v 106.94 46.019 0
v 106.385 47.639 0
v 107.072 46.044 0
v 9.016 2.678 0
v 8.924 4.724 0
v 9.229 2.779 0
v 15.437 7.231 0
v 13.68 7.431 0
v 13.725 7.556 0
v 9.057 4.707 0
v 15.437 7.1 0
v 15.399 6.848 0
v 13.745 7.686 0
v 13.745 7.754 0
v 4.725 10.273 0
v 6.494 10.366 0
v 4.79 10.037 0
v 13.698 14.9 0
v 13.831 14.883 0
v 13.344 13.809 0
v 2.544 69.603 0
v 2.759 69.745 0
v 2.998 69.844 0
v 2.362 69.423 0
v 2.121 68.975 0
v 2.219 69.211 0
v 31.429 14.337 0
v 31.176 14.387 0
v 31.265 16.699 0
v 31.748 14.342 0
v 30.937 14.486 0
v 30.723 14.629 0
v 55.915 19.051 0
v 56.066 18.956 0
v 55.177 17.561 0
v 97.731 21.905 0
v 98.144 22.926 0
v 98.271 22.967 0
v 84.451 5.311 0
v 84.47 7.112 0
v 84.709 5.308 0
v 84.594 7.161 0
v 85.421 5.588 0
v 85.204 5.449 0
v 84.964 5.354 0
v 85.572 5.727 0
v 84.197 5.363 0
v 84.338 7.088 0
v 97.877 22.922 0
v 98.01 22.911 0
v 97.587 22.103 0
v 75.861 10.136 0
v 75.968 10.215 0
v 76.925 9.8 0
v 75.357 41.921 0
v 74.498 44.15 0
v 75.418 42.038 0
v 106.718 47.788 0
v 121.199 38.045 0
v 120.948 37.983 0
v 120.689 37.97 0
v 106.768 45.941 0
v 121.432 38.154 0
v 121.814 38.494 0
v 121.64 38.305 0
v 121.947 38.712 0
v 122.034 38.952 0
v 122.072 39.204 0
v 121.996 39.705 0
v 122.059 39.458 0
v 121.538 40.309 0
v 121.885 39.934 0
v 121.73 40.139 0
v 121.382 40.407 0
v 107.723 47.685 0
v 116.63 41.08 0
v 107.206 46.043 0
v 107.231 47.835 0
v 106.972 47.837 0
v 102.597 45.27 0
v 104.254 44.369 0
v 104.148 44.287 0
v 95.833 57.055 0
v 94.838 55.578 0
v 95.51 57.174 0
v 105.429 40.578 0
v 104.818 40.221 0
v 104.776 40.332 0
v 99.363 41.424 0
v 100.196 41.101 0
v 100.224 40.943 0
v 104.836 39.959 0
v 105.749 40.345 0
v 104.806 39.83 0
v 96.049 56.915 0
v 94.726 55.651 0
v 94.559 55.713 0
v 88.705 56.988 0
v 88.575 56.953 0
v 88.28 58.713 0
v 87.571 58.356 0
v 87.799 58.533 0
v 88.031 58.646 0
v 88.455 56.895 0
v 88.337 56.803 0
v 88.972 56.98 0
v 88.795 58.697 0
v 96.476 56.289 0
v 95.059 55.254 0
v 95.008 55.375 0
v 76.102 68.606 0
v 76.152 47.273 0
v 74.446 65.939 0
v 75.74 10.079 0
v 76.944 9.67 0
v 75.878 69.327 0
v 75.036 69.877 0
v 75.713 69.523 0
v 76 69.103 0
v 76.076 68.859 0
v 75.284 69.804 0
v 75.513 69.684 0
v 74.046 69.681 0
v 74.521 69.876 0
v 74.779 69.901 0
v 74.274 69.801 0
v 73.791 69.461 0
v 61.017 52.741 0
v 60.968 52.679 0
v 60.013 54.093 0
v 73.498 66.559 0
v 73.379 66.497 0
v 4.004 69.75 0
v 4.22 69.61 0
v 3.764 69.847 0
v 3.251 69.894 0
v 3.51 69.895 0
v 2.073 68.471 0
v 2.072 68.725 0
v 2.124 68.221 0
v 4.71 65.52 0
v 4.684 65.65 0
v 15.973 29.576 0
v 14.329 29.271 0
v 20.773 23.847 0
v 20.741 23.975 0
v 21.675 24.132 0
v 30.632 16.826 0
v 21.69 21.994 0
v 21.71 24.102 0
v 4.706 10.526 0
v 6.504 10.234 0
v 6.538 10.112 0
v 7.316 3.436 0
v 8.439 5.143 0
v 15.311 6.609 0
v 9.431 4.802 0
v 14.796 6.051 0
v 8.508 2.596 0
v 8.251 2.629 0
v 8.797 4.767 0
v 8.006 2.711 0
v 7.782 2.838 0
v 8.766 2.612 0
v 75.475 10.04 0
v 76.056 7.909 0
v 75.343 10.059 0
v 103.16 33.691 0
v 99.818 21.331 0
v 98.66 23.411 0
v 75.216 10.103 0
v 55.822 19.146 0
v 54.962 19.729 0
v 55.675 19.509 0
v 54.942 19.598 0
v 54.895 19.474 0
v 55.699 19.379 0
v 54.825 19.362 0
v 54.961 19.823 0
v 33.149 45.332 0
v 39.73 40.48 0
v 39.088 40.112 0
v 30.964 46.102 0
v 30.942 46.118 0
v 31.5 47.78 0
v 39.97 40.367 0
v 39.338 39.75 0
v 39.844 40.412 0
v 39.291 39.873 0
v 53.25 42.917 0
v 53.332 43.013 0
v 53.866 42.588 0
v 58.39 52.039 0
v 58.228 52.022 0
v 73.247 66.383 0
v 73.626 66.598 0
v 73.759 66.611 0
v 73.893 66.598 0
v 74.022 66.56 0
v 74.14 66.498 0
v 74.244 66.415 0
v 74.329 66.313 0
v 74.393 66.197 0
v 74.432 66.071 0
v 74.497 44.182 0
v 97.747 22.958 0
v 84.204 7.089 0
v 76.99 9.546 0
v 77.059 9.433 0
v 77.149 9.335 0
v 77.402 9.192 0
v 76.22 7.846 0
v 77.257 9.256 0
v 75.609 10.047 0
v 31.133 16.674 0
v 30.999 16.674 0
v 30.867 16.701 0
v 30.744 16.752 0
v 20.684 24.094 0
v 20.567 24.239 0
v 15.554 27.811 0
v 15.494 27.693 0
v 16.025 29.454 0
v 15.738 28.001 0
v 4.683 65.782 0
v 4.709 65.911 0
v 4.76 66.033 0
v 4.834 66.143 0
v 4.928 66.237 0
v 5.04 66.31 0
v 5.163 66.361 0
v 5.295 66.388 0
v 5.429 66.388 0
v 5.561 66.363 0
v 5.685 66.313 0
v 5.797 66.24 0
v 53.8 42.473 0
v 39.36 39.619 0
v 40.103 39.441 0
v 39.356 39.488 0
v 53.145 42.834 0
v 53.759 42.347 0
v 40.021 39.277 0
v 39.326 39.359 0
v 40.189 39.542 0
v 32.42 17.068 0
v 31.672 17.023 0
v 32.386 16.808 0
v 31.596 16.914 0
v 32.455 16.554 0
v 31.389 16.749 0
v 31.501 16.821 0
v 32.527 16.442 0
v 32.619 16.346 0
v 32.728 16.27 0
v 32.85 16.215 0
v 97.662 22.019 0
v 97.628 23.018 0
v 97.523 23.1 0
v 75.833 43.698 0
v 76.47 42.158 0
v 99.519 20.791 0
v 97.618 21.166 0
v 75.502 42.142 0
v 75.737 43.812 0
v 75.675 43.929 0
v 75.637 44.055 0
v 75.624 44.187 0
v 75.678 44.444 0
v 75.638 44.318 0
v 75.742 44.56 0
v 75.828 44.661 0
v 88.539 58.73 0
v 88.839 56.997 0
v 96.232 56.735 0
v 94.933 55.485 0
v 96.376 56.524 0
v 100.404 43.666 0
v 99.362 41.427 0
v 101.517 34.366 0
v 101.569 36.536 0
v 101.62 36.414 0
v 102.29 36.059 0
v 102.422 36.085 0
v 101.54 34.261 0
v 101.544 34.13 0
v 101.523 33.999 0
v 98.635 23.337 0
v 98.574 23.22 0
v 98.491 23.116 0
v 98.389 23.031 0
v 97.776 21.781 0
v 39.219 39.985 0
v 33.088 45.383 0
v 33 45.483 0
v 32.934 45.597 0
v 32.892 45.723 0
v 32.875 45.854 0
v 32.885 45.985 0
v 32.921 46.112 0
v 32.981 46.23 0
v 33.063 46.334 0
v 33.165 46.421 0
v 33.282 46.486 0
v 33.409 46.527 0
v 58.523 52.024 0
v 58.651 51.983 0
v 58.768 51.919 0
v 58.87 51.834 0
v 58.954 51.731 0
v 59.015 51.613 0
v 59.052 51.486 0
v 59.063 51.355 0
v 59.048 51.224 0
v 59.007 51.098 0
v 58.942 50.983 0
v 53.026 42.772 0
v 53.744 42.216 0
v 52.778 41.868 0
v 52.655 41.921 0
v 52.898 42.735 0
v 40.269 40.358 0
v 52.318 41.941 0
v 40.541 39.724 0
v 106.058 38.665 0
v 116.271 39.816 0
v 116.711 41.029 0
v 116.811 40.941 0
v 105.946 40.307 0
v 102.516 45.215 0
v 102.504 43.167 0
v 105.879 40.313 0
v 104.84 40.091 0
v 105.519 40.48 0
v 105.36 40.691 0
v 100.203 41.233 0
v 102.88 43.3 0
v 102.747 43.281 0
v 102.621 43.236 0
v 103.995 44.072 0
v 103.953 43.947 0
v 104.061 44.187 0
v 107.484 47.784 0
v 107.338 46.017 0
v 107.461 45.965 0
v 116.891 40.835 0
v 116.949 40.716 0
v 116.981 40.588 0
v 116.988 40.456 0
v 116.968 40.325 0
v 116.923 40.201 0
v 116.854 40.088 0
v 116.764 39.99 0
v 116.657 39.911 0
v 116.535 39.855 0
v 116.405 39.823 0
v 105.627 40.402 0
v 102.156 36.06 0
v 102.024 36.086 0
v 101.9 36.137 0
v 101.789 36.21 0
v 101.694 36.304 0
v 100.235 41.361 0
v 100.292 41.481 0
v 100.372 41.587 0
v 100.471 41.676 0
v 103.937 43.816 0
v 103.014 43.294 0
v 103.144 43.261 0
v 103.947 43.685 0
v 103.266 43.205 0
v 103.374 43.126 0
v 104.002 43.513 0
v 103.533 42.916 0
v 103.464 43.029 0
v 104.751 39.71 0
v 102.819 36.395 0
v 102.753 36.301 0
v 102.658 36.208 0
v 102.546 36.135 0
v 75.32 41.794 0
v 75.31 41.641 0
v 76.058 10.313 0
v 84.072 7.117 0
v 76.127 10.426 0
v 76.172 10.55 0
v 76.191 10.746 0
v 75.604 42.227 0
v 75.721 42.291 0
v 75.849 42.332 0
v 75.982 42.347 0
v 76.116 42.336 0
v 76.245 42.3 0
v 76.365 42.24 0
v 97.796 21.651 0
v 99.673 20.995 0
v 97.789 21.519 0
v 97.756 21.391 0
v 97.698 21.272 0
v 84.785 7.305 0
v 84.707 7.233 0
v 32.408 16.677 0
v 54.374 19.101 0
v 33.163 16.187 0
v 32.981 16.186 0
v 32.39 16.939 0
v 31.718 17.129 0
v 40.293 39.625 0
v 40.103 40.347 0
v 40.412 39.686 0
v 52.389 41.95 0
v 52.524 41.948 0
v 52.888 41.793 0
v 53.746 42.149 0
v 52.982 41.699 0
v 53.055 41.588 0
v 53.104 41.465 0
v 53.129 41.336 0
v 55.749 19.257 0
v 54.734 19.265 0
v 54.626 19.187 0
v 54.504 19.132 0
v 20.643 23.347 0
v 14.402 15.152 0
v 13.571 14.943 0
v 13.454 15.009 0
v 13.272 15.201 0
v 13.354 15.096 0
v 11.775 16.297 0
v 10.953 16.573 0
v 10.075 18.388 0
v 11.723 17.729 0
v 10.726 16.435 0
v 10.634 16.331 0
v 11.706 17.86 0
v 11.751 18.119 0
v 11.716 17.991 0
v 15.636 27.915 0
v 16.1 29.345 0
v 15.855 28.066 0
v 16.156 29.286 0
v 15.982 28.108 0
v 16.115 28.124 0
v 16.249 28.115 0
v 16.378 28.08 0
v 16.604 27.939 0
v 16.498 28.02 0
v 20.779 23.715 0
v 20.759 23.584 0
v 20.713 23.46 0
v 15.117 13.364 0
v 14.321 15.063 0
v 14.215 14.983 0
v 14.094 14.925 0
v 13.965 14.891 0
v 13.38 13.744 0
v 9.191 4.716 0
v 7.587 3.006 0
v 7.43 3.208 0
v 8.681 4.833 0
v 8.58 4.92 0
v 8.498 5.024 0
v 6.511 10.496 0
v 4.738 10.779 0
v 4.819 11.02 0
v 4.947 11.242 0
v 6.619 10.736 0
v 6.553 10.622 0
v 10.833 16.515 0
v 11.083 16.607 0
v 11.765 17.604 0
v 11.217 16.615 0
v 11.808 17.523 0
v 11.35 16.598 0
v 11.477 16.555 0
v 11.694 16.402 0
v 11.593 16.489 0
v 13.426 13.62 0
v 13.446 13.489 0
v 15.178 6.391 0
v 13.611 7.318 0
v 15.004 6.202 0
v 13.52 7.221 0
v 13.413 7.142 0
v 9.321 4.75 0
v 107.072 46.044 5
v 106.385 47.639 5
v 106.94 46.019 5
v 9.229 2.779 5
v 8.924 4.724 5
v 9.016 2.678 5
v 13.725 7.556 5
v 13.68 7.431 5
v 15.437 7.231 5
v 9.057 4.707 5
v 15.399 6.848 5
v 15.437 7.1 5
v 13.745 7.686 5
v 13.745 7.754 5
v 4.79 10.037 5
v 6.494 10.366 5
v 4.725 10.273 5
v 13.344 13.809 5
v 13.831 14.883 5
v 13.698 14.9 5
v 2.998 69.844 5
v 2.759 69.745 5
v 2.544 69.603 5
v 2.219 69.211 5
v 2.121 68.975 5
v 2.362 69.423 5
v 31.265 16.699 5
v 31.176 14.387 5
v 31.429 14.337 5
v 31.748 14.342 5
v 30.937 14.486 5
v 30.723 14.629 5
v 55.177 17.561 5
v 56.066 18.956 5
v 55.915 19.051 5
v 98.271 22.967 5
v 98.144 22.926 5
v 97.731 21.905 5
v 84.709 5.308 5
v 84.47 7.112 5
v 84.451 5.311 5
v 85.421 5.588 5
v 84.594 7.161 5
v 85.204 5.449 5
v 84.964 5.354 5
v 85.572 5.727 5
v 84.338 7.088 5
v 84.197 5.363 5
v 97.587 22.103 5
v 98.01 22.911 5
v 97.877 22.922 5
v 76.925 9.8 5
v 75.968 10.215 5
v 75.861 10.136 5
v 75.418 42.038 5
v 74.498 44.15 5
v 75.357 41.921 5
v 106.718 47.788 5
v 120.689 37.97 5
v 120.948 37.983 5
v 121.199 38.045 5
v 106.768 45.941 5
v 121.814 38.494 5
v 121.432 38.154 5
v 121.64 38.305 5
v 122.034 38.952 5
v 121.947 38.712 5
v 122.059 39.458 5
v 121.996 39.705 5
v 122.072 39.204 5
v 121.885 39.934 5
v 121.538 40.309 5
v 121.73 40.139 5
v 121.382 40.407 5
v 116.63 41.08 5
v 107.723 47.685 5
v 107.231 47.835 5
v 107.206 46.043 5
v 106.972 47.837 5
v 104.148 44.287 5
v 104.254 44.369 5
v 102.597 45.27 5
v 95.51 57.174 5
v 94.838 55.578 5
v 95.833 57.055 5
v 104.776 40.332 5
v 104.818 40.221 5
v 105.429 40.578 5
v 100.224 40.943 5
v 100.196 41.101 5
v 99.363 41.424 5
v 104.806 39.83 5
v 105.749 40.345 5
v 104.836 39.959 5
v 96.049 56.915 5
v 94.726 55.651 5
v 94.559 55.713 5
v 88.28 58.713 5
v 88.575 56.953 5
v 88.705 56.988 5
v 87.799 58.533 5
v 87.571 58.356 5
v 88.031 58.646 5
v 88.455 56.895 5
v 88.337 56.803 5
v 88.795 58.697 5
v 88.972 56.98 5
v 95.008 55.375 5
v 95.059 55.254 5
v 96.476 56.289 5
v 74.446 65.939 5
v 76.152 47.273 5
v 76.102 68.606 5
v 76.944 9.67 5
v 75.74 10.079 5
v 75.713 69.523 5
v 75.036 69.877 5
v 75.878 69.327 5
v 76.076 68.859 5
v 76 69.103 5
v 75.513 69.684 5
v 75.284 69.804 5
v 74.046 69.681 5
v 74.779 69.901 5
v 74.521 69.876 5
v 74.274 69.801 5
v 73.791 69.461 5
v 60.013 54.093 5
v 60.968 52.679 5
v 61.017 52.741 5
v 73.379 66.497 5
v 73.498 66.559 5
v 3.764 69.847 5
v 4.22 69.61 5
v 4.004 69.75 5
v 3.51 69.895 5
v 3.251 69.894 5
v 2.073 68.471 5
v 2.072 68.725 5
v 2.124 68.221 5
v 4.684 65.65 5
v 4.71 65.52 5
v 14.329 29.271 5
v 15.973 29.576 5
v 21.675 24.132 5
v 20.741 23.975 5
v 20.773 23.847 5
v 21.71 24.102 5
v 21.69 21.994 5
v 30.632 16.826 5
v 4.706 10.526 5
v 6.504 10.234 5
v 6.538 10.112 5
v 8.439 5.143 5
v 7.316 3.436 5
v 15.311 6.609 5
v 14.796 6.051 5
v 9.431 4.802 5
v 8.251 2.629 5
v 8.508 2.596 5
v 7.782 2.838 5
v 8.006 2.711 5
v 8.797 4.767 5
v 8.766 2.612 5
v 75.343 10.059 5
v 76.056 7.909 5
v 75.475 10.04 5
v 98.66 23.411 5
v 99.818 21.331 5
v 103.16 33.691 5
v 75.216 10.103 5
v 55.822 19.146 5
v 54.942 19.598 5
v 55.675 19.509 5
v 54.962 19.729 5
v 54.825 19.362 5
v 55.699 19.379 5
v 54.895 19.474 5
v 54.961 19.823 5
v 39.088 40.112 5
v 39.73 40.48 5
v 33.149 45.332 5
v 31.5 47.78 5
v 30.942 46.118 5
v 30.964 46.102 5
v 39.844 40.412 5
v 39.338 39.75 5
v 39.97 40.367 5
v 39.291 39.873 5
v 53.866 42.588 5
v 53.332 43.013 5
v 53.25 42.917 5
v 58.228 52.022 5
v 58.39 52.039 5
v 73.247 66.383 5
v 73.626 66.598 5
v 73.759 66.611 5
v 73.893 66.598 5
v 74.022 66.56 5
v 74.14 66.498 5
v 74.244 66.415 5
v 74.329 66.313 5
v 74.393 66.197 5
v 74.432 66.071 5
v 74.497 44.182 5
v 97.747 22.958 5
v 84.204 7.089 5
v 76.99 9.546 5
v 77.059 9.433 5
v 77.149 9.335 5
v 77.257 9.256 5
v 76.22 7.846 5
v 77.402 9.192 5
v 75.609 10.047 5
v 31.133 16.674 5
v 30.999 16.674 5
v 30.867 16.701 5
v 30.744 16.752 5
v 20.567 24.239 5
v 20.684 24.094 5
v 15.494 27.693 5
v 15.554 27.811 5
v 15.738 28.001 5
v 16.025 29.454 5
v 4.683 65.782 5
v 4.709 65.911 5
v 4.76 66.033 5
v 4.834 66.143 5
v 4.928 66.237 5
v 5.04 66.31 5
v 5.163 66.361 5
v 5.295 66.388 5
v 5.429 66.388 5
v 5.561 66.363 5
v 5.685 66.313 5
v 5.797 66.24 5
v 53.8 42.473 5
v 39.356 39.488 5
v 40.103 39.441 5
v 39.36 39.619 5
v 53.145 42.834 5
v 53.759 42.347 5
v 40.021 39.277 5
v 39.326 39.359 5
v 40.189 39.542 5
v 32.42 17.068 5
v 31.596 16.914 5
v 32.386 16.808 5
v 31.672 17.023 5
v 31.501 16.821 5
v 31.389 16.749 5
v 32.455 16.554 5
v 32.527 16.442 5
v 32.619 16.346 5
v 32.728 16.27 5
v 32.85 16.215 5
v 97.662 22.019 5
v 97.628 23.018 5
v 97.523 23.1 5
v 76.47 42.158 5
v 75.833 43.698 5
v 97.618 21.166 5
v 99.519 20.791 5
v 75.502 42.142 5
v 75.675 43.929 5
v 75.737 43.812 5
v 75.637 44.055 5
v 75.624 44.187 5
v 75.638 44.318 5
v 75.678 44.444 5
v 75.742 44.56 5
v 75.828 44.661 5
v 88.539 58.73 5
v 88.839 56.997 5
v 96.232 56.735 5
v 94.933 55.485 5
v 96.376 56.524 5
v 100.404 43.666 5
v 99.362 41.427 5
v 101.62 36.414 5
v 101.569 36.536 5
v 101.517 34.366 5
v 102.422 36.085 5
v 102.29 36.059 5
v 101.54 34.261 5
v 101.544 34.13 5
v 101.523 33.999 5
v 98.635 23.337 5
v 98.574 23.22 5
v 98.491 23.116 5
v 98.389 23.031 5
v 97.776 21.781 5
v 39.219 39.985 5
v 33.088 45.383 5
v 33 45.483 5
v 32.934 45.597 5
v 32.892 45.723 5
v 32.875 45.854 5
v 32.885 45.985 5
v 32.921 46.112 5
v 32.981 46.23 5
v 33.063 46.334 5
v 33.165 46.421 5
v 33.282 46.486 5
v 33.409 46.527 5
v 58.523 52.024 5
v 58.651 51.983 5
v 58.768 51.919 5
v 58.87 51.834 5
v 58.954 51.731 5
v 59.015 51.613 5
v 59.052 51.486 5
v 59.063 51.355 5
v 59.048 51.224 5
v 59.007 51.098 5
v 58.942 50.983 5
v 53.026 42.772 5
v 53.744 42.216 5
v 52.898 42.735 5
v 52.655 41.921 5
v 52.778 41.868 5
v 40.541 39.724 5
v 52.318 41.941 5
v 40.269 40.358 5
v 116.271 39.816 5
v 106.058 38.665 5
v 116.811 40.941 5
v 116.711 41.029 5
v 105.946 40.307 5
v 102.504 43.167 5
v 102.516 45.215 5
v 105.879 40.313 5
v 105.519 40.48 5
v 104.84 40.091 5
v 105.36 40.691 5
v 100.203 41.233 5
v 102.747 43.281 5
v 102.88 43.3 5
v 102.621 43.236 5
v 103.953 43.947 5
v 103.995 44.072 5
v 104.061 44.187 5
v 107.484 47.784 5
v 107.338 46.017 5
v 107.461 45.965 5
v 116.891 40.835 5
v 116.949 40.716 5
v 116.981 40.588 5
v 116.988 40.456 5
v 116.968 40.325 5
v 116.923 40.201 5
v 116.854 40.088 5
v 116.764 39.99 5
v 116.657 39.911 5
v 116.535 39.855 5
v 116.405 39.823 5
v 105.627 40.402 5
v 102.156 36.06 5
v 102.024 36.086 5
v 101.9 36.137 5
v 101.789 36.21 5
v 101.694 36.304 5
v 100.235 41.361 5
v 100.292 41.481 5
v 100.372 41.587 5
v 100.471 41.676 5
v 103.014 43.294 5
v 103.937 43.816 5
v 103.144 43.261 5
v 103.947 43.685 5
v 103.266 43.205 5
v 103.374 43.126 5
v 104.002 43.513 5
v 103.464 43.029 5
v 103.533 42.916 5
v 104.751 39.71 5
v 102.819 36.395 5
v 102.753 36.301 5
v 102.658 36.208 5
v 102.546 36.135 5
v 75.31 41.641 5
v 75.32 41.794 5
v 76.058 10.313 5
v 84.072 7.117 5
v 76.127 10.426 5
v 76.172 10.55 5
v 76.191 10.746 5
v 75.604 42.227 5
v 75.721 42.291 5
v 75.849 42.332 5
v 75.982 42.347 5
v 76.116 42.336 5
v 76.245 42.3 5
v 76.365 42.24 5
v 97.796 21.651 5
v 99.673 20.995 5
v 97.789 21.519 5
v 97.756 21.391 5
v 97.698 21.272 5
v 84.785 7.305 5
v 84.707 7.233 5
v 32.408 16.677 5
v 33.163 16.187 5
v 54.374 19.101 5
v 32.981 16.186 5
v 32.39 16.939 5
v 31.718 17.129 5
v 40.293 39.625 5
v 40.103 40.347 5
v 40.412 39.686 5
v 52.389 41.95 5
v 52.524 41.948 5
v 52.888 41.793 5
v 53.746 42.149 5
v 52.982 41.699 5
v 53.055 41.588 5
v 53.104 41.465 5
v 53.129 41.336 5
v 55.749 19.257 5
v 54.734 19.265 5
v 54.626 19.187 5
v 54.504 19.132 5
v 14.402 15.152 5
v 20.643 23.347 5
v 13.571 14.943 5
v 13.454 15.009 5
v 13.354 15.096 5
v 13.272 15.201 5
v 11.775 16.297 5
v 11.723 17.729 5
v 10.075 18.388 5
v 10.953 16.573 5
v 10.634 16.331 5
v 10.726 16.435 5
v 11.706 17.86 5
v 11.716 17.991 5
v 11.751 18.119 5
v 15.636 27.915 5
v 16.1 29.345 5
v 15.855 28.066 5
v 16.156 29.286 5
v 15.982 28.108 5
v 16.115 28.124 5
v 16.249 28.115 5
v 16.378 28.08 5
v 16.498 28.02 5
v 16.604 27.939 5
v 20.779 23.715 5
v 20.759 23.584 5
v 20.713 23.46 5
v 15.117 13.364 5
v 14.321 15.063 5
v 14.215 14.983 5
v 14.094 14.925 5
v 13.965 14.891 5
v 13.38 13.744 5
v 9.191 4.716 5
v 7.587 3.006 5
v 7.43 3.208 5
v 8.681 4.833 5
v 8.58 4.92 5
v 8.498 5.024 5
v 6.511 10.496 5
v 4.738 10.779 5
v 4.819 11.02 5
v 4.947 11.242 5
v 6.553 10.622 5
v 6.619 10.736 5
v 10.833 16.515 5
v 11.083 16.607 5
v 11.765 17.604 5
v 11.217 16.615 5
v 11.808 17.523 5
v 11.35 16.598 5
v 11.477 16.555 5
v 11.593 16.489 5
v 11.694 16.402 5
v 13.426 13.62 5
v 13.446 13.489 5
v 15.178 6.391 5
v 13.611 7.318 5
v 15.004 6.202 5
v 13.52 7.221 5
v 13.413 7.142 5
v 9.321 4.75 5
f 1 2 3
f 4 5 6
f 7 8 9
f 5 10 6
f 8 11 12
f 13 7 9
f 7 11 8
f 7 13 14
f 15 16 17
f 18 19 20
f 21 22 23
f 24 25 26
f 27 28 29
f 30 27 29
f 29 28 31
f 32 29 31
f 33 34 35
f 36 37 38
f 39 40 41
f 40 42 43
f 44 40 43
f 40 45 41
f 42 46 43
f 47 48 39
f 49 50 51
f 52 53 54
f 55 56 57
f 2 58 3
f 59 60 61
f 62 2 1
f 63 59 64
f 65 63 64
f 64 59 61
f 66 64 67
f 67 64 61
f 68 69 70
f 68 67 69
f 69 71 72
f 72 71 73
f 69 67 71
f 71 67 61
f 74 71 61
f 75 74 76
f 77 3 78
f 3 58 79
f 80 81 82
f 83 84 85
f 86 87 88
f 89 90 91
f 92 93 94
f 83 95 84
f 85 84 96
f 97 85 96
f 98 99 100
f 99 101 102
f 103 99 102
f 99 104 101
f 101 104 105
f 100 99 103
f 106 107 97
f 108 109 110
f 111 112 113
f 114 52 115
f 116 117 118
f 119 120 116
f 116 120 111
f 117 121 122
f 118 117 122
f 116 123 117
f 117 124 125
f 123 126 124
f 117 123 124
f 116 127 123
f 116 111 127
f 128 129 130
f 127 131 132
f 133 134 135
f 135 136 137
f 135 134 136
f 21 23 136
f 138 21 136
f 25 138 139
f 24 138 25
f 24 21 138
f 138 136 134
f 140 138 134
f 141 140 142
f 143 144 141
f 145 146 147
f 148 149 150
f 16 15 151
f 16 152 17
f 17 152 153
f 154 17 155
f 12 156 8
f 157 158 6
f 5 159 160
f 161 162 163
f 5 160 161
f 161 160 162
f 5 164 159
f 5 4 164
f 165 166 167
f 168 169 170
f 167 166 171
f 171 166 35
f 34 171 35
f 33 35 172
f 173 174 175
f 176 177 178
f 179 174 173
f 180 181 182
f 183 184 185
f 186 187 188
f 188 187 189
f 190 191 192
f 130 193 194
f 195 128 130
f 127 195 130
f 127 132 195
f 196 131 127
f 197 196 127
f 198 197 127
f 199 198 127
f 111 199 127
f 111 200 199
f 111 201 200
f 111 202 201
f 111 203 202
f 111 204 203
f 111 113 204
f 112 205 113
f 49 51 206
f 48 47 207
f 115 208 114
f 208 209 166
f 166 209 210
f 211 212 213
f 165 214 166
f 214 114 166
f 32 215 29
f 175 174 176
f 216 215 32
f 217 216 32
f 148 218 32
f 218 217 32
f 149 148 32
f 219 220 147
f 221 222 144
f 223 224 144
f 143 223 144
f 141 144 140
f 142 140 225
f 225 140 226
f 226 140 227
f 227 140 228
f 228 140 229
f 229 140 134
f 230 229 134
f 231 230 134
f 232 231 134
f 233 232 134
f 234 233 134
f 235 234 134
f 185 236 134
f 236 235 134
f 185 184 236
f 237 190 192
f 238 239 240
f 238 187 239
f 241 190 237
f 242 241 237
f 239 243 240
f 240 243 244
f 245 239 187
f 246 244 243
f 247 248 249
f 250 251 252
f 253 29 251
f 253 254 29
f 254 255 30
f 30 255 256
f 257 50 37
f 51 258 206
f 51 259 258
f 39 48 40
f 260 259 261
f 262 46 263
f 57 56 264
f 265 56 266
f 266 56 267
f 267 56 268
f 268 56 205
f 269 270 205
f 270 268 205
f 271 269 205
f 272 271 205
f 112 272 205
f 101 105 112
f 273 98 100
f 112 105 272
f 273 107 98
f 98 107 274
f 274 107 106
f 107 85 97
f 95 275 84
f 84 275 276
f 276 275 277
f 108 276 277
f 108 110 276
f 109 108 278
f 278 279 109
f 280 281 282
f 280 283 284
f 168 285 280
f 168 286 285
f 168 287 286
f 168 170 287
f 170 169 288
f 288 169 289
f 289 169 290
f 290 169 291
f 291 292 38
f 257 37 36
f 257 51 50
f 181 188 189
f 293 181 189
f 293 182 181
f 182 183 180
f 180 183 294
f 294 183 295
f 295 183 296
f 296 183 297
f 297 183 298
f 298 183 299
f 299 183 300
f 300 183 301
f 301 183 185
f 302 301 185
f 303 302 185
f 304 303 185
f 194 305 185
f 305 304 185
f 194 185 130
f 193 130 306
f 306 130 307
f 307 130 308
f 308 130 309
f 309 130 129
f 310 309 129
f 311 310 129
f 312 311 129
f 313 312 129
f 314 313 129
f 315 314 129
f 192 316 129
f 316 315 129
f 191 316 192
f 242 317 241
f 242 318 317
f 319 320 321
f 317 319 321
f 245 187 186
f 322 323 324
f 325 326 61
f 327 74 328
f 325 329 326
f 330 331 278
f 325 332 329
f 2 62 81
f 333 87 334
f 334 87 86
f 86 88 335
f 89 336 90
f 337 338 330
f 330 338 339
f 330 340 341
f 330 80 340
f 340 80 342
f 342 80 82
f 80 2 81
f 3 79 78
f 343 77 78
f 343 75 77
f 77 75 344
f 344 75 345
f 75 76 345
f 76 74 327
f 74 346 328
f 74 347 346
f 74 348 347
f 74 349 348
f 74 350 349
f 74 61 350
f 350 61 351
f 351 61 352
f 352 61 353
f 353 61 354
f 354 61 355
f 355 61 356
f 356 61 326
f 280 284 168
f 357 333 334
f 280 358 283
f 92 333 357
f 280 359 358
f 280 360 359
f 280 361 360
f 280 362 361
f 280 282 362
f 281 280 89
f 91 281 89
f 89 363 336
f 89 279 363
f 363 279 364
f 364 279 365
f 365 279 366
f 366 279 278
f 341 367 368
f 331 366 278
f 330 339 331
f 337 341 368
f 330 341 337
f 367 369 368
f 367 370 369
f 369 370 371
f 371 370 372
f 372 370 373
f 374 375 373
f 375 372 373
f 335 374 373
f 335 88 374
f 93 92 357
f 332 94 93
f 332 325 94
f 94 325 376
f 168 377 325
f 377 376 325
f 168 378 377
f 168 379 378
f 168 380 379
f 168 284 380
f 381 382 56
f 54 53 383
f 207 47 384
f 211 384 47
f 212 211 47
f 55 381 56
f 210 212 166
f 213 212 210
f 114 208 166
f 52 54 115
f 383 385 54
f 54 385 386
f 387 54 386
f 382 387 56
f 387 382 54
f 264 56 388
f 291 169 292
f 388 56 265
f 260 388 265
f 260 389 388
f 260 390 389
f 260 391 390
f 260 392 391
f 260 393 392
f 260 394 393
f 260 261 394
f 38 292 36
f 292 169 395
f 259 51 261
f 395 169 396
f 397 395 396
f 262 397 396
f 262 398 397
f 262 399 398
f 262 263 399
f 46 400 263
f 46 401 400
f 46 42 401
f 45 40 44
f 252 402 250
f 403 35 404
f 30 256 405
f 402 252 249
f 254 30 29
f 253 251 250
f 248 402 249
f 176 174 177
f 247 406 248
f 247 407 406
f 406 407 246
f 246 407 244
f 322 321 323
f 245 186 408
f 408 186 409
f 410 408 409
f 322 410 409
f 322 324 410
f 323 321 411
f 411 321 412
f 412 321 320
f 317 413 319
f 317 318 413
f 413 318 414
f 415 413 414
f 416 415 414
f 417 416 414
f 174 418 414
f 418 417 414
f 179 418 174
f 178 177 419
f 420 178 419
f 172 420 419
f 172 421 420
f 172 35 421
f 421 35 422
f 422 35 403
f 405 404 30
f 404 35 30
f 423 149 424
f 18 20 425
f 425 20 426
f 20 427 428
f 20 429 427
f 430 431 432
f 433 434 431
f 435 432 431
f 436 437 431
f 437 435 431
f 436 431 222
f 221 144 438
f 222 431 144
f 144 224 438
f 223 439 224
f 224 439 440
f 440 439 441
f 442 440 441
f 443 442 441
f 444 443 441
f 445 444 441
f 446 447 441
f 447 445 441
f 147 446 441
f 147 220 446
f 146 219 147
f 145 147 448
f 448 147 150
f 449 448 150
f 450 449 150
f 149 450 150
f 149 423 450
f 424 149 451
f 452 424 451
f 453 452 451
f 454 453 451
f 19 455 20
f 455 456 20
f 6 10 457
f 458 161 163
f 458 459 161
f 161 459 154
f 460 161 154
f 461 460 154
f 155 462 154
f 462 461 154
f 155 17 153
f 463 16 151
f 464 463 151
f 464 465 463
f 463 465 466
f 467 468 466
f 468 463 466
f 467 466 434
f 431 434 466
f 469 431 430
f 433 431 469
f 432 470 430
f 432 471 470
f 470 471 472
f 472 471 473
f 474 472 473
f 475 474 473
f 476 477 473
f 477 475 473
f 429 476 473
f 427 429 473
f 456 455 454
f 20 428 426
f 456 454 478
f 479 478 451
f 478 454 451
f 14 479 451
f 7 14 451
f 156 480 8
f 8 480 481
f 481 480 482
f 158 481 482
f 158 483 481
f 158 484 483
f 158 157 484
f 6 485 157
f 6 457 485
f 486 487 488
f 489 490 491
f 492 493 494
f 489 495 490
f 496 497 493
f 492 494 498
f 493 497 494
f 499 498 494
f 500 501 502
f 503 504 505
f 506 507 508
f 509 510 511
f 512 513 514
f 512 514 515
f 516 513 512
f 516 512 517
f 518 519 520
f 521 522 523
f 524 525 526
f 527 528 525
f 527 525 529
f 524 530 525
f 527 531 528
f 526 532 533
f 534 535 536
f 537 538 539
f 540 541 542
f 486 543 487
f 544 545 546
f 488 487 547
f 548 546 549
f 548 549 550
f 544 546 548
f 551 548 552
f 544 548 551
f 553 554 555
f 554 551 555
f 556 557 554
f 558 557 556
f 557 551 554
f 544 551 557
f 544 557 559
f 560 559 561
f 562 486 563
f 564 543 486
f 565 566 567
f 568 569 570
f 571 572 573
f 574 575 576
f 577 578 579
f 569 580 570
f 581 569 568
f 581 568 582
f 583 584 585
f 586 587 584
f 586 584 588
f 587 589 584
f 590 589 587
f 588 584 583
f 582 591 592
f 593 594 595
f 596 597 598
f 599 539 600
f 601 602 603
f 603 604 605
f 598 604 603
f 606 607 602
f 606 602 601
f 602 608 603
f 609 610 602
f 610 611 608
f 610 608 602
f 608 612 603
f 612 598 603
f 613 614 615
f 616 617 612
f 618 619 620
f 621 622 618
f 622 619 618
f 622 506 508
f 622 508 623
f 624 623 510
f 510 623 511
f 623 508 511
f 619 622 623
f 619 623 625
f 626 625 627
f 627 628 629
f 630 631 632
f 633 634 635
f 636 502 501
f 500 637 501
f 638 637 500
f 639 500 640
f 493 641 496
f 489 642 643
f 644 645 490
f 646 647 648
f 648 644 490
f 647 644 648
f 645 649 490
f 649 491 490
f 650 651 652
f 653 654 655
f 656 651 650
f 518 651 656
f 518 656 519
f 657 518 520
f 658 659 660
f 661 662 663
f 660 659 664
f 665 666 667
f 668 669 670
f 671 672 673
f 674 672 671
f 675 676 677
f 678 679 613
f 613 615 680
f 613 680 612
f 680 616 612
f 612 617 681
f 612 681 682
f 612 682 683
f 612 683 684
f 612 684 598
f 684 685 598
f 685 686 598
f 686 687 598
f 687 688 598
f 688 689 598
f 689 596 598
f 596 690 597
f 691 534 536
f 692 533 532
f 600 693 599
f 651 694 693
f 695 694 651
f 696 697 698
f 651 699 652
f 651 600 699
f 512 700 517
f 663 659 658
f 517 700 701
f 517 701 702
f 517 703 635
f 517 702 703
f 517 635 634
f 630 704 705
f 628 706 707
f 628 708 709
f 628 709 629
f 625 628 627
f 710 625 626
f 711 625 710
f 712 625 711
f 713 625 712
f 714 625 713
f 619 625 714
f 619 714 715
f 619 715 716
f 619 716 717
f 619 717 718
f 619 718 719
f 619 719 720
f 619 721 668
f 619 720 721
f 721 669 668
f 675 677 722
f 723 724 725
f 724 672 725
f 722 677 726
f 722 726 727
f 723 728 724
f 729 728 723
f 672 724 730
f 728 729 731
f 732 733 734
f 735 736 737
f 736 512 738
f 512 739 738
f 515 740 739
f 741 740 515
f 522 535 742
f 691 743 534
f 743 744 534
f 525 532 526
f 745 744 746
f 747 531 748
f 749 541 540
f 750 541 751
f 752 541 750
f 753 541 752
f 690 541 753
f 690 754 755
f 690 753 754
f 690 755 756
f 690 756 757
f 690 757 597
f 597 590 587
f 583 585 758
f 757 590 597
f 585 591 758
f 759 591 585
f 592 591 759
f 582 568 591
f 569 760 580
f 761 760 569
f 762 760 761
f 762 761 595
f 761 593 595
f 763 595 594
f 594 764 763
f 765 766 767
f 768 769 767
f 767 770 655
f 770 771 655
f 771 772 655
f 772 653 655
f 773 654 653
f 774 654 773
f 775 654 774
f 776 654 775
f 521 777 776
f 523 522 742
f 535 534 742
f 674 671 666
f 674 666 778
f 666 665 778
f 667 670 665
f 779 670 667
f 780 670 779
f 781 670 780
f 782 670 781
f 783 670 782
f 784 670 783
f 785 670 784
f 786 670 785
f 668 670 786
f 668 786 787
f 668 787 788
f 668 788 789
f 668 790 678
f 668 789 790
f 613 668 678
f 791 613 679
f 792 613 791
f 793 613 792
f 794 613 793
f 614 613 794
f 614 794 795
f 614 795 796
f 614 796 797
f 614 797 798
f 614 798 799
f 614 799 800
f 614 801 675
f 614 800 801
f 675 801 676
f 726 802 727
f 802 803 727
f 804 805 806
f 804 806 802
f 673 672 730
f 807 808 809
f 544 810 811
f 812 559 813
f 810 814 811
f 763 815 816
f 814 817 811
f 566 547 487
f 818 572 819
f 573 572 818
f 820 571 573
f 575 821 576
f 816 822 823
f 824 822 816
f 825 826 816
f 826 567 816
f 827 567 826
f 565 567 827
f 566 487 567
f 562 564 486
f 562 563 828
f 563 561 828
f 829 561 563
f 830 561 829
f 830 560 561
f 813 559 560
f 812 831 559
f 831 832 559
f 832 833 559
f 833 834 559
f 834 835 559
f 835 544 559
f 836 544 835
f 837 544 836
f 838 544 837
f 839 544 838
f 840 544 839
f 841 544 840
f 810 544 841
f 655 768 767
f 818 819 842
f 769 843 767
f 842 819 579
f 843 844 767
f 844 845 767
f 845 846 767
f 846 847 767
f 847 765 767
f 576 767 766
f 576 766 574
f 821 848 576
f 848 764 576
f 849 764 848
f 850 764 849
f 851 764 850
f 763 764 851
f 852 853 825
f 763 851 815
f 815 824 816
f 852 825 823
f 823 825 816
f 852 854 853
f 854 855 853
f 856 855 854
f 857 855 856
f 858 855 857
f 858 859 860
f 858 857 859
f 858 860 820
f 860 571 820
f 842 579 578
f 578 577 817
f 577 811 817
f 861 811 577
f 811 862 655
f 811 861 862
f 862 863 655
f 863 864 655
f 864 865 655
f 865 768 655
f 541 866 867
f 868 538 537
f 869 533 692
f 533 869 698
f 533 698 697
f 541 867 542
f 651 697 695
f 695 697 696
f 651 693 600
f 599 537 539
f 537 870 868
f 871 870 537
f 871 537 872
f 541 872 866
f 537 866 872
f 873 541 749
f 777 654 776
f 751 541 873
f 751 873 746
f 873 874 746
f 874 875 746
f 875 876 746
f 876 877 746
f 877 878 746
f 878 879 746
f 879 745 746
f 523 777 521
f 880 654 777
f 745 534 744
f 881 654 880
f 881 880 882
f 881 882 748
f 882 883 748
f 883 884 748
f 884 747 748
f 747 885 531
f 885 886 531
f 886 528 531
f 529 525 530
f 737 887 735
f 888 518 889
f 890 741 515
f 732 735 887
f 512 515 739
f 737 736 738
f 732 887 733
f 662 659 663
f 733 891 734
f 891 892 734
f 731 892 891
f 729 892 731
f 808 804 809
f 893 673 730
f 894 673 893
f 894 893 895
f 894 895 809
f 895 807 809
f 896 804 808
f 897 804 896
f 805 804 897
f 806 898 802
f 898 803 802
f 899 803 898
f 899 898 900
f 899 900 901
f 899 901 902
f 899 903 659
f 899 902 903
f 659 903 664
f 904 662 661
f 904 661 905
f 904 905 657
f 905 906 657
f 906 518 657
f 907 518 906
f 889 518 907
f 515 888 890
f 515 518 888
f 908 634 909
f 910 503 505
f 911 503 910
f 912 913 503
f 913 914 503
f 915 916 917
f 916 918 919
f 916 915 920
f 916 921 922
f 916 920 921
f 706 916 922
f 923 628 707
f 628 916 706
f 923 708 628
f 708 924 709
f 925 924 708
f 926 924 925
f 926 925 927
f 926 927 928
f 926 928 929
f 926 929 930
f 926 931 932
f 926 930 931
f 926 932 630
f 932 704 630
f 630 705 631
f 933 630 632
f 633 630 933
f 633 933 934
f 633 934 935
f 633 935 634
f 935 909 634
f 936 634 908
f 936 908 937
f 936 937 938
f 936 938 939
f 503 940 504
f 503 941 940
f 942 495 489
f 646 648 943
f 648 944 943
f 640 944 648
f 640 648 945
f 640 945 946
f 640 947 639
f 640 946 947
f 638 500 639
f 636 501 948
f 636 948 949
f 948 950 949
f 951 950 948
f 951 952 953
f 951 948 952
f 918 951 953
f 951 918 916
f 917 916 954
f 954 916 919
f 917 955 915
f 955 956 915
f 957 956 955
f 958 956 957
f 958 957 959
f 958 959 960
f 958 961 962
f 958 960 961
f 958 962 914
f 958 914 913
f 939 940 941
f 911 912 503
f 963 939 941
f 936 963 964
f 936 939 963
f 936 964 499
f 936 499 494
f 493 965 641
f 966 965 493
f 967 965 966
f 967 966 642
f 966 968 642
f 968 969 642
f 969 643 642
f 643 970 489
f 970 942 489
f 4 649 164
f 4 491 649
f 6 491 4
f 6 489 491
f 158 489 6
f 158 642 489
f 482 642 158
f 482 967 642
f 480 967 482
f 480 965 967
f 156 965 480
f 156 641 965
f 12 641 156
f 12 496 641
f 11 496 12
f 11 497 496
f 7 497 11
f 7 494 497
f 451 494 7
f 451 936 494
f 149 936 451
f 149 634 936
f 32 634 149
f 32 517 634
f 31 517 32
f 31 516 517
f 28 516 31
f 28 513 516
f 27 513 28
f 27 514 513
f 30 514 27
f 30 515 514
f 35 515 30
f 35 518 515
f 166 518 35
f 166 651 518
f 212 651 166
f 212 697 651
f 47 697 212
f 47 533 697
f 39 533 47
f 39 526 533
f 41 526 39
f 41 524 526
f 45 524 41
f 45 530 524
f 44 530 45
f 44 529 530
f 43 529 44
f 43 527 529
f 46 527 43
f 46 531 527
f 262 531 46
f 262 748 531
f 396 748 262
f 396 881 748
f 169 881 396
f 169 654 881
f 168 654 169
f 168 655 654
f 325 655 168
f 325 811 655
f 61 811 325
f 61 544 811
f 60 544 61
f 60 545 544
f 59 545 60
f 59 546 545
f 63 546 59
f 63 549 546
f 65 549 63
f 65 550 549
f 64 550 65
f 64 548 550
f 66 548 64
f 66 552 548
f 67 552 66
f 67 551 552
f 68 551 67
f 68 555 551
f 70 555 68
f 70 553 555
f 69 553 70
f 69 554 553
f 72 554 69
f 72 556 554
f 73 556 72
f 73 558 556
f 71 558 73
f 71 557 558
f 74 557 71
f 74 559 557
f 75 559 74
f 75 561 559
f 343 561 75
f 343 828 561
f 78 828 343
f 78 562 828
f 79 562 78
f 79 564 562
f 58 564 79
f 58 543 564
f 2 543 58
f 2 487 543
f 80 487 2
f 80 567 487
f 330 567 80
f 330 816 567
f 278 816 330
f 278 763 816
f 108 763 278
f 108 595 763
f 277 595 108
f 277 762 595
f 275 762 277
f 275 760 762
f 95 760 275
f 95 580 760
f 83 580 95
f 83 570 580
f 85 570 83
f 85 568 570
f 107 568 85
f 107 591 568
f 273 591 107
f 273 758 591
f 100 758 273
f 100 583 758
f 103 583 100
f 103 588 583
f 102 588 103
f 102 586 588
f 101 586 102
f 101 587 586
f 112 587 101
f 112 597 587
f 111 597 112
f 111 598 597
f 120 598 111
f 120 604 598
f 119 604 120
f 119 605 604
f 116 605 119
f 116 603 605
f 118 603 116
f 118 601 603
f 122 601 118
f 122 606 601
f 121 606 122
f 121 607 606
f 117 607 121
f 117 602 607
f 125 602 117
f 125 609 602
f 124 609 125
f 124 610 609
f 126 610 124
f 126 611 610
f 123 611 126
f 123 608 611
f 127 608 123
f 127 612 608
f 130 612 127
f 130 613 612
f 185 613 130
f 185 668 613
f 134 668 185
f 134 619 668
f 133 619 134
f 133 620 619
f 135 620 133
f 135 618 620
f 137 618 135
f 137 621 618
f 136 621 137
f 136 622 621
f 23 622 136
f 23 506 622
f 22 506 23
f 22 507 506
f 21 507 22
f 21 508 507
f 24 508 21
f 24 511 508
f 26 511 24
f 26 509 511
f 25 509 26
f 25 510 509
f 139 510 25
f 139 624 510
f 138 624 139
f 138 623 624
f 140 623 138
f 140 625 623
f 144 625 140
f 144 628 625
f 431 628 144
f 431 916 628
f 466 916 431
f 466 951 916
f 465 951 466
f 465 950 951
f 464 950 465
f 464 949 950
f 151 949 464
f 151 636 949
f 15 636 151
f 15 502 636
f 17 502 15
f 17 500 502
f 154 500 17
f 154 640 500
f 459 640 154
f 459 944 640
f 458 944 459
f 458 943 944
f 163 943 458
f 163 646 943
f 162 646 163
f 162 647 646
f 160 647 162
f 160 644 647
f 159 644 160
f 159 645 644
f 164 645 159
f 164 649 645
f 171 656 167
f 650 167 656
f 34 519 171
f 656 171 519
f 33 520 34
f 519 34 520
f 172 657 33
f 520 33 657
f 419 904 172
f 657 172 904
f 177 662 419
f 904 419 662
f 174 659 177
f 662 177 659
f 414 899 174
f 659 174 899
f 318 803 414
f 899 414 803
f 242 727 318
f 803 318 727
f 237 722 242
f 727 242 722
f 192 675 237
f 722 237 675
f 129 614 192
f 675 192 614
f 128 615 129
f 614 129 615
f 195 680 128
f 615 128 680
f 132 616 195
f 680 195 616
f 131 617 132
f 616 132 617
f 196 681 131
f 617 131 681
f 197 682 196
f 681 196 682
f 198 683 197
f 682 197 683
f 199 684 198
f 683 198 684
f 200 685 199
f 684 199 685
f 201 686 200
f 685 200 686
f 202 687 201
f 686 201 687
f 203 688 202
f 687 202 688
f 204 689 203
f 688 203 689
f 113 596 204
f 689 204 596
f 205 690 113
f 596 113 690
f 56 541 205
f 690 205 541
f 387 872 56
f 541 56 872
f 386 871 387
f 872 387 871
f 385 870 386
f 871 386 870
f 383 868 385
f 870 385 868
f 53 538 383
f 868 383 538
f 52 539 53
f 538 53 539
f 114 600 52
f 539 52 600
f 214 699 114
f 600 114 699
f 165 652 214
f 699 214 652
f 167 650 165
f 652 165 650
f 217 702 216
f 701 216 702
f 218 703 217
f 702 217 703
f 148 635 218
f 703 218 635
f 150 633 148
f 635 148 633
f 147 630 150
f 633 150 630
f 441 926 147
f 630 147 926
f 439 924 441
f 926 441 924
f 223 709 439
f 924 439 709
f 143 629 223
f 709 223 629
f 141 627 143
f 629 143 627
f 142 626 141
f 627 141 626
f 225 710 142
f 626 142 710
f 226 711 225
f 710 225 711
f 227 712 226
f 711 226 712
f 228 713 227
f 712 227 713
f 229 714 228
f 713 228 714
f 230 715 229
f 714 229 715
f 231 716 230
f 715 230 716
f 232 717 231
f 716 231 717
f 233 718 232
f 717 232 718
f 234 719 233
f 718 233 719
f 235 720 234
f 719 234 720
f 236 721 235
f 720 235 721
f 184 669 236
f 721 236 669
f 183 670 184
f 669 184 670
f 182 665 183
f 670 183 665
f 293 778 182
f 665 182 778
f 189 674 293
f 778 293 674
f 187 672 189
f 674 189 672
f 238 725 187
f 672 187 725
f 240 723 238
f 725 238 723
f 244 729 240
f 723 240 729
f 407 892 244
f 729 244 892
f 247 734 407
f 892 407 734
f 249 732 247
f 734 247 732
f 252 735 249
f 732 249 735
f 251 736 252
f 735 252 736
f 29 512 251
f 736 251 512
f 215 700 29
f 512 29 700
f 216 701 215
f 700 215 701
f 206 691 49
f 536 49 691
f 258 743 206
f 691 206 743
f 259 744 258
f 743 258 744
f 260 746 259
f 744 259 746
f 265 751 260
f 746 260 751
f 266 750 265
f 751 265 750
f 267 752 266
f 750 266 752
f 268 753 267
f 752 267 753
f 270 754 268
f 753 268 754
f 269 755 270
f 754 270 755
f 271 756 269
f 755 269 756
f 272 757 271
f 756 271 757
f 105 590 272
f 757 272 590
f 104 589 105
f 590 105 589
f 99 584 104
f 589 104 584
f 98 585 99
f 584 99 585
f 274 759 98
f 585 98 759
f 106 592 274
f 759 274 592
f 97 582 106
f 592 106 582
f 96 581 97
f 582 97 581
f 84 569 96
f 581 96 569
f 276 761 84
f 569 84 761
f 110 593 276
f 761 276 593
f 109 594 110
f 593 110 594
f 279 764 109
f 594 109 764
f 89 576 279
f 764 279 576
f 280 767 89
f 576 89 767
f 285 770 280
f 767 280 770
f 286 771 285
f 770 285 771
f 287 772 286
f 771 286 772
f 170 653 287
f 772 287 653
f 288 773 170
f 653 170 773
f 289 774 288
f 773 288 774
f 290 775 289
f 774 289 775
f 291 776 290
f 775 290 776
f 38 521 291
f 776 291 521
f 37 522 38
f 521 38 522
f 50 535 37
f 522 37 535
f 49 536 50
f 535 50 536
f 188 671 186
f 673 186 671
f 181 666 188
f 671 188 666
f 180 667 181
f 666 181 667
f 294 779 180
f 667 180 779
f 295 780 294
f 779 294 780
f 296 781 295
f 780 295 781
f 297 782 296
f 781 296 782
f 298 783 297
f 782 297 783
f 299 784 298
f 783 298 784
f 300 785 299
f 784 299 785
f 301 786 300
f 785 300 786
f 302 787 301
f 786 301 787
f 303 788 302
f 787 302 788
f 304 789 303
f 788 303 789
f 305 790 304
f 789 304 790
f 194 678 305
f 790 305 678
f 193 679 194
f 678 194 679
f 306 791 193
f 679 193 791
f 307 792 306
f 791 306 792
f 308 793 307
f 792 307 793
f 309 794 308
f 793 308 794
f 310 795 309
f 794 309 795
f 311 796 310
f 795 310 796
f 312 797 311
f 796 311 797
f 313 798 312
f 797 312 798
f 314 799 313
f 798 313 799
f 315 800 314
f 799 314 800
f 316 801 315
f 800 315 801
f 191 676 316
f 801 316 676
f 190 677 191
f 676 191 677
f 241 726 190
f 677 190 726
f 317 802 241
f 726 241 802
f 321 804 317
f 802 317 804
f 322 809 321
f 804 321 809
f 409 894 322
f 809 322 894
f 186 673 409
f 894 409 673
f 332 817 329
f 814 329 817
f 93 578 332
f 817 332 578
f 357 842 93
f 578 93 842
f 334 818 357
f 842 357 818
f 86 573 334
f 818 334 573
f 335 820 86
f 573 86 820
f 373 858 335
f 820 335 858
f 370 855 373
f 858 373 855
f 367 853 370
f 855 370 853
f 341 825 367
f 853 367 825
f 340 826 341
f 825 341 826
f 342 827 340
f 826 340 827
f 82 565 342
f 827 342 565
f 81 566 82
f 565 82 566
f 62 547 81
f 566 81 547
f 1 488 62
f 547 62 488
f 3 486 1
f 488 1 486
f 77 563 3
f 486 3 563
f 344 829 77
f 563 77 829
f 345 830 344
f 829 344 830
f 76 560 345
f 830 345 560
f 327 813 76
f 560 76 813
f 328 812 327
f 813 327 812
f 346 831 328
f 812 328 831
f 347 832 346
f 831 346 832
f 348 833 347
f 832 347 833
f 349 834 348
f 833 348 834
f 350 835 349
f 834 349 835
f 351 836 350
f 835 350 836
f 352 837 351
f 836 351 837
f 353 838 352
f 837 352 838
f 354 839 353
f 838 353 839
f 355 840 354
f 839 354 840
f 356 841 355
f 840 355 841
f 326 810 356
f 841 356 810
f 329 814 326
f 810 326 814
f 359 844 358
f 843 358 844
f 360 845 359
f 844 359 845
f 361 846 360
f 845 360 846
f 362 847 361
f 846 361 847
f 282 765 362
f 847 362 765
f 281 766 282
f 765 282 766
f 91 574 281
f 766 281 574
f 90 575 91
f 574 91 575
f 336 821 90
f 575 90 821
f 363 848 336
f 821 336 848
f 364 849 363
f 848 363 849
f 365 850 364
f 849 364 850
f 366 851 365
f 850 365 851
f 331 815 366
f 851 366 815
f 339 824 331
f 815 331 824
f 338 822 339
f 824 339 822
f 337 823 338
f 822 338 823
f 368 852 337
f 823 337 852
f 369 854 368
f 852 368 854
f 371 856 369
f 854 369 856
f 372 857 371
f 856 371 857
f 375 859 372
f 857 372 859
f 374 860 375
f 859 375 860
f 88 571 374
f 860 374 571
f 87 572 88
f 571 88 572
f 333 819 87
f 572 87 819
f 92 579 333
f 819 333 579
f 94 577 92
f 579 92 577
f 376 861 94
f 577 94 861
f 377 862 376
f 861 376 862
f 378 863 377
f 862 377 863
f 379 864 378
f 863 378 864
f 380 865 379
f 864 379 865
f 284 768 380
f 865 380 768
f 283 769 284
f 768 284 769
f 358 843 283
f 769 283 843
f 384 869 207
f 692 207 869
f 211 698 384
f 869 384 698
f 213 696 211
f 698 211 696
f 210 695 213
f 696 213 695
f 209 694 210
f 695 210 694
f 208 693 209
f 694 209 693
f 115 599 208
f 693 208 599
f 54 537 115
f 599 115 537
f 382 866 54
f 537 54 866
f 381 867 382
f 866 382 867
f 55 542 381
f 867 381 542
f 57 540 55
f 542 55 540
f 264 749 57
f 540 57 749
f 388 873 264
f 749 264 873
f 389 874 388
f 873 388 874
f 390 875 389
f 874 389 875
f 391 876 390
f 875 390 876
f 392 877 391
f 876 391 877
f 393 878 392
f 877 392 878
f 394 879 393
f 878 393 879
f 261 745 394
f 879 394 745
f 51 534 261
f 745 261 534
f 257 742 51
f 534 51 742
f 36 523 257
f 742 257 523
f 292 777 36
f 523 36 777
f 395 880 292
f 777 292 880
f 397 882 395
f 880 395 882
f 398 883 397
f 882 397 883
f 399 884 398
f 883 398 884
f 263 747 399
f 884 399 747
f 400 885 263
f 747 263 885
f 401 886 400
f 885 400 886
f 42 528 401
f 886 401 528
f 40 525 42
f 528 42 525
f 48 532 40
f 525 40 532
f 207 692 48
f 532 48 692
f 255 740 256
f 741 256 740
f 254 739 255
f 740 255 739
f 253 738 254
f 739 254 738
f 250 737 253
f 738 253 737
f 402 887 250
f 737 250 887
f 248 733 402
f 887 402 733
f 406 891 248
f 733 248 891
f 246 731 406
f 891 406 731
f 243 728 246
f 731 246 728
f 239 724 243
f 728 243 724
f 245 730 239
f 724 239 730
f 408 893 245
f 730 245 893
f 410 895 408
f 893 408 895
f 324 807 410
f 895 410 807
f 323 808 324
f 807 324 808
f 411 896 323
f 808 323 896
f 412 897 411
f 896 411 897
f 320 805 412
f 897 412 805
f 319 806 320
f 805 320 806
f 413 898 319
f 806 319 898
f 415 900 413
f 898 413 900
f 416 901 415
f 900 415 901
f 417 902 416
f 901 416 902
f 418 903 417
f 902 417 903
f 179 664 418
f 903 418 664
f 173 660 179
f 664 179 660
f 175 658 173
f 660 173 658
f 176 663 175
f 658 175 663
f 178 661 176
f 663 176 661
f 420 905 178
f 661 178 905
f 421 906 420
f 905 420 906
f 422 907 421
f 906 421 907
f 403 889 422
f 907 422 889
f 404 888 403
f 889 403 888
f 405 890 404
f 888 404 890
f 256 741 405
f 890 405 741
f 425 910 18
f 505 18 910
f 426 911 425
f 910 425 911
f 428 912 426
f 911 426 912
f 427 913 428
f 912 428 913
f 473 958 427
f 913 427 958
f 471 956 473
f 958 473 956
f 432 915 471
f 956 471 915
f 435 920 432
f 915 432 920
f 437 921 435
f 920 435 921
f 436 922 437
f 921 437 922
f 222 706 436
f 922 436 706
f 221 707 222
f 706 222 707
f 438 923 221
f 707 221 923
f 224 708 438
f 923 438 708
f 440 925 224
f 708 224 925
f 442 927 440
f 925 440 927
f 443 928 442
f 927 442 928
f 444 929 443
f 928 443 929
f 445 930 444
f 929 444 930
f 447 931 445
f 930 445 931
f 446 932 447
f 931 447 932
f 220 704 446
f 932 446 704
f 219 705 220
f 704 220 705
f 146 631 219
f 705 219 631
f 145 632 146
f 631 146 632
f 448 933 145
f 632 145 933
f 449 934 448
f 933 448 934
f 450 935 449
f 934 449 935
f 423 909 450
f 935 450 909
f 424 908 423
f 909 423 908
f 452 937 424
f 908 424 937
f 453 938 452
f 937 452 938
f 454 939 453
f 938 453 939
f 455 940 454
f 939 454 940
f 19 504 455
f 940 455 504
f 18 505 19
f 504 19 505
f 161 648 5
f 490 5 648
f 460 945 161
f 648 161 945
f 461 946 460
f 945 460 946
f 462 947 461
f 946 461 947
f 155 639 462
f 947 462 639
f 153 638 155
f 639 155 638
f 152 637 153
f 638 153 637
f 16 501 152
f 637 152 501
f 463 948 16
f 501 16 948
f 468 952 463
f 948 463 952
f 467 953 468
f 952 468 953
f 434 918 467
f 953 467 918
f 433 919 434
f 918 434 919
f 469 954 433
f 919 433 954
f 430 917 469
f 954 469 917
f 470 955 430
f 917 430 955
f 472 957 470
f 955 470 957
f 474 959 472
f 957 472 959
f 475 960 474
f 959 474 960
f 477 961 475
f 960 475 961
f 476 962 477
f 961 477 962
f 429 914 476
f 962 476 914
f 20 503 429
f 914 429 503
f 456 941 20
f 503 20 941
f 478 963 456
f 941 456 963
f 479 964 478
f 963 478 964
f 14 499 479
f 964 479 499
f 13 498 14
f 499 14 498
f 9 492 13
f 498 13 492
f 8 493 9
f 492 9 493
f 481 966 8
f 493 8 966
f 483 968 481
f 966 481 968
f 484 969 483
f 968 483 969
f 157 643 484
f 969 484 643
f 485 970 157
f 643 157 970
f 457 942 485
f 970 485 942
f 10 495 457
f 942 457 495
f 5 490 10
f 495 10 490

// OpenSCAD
/*
 * Customizable Origami - Bull - https://www.thingiverse.com/thing:2630699
 * by Dennis Hofmann - https://www.thingiverse.com/mightynozzle/about
 * created 2017-11-07
 * version v1.0
 *
 * Changelog
 * --------------
 * v1.0:
 *      - final design
 * --------------
 * 
 * This work is licensed under the Creative Commons - Attribution - NonCommercial - ShareAlike license.
 * https://creativecommons.org/licenses/by-nc-sa/3.0/
 */


 // Parameter Section //
//-------------------//

// preview[view:north, tilt:top]

// The maximum size of the longest side. The shorter side will be automatically resized in same ratio.
max_size_in_millimeter = 120; //[20:300]

// The height of the model.
model_height_in_millimeter = 5; //[0.2:0.2:100]

// Thickness of the outer outline.
outline_size_in_millimeter = 1.7; //[0.5:0.1:20]

// Thickness of the inner outline.
inline_size_in_millimeter = 0.7; //[0.5:0.1:20]

// Roundiness of the ends of the inner outlines.
inline_edge_radius_in_millimeter = 0.7; //[0.0:0.1:5]

// Flip model
flip_model = "no"; //[yes,no]

/*[hidden]*/
max_size = max_size_in_millimeter;
model_height = model_height_in_millimeter;
$fn=32;

// Outer Points
A1 = [149, 69];
A2 = [246, 127];
A3 = [240, 244];
A4 = [374, 423];
A5 = [550, 277];
A6 = [965, 335];
A7 = [1335, 161];
A8 = [1474, 117];
A9 = [1717, 384];
A10 = [1776, 606];
A11 = [1835, 709];
A12 = [2104, 696];
A13 = [1866, 825];
A14 = [1800, 783];
A15 = [1737, 736];
A16 = [1659, 991];
A17 = [1542, 1018];
A18 = [1304, 783];
A19 = [1303, 1216];
A20 = [1058, 938];
A21 = [543, 822];
A22 = [59, 1216];
A23 = [274, 518];
A24 = [196, 315];
A25 = [105, 186];

outline = [A1, A2, A3, A4, A5, A6, A7, A8, A9, A10, A11, A12, A13, A14, A15, A16, A17, A18, A19, A20, A21, A22, A23, A24, A25];

// Inner Points
B1 = [695, 708];
B2 = [930, 753];

// Polygons
C1 = [A24, A25, A1, A2, A3];
C2 = [A24, A3, A4, A23];
C3 = [A4, A5, B1, A21, A22, A23];
C4 = [A21, A20, B2, B1];
C5 = [B1, A5, A6, B2];
C6 = [A6, A7, A18, A19, A20, B2];
C7 = [A7, A8, A9, A18];
C8 = [A9, A10, A15, A16, A17, A18];
C9 = [A10, A11, A14, A15];
C10 = [A11, A12, A13, A14];

cut_polygons = [C1, C2, C3, C4, C5, C6, C7, C8, C9, C10];

min_x = A22[0];
min_y = A1[1];
max_x = A12[0];
max_y = A19[1];


x_size = max_x - min_x;
y_size = max_y - min_y;

x_factor = max_size / x_size;
y_factor = max_size / y_size;

inline_size = x_size > y_size ? inline_size_in_millimeter / x_factor / 2: inline_size_in_millimeter / y_factor / 2;
inline_edge_radius = x_size > y_size ? inline_edge_radius_in_millimeter / x_factor: inline_edge_radius_in_millimeter / y_factor;
outline_size = x_size > y_size ? outline_size_in_millimeter / x_factor - inline_size: outline_size_in_millimeter / y_factor - inline_size;


 // Program Section //
//-----------------//

if(x_size > y_size) {
    resize(newsize=[max_size, x_factor * y_size, model_height]){
        if(flip_model == "yes") {
            mirror([0,1,0]) {
                rotate([180,180,0]) {    
                    create(outline, cut_polygons);
                }
            }
        } else {
            create(outline, cut_polygons);
        }
    }
} else {
    resize(newsize=[y_factor * x_size, max_size, model_height]){
        if(flip_model == "yes") {
            mirror([0,1,0]) {
                rotate([180,180,0]) {    
                    create(outline, cut_polygons);
                }
            }
        } else {
            create(outline, cut_polygons);
        }
    }
}


 // Module Section //
//----------------//

module create() {
    linear_extrude(height=1) {
        difference() {
            offset(r = -0) {
                offset(r = +outline_size) {
                    polygon(points = outline, convexity = 10);
                }
            }
            
            for(cut_polygon = [0:len(cut_polygons)]) {
                offset(r = +inline_edge_radius) {
                    offset(r = -inline_size - inline_edge_radius) {
                        polygon(points = cut_polygons[cut_polygon], convexity = 10);
                    }
                }
            }
        }
    }
}
